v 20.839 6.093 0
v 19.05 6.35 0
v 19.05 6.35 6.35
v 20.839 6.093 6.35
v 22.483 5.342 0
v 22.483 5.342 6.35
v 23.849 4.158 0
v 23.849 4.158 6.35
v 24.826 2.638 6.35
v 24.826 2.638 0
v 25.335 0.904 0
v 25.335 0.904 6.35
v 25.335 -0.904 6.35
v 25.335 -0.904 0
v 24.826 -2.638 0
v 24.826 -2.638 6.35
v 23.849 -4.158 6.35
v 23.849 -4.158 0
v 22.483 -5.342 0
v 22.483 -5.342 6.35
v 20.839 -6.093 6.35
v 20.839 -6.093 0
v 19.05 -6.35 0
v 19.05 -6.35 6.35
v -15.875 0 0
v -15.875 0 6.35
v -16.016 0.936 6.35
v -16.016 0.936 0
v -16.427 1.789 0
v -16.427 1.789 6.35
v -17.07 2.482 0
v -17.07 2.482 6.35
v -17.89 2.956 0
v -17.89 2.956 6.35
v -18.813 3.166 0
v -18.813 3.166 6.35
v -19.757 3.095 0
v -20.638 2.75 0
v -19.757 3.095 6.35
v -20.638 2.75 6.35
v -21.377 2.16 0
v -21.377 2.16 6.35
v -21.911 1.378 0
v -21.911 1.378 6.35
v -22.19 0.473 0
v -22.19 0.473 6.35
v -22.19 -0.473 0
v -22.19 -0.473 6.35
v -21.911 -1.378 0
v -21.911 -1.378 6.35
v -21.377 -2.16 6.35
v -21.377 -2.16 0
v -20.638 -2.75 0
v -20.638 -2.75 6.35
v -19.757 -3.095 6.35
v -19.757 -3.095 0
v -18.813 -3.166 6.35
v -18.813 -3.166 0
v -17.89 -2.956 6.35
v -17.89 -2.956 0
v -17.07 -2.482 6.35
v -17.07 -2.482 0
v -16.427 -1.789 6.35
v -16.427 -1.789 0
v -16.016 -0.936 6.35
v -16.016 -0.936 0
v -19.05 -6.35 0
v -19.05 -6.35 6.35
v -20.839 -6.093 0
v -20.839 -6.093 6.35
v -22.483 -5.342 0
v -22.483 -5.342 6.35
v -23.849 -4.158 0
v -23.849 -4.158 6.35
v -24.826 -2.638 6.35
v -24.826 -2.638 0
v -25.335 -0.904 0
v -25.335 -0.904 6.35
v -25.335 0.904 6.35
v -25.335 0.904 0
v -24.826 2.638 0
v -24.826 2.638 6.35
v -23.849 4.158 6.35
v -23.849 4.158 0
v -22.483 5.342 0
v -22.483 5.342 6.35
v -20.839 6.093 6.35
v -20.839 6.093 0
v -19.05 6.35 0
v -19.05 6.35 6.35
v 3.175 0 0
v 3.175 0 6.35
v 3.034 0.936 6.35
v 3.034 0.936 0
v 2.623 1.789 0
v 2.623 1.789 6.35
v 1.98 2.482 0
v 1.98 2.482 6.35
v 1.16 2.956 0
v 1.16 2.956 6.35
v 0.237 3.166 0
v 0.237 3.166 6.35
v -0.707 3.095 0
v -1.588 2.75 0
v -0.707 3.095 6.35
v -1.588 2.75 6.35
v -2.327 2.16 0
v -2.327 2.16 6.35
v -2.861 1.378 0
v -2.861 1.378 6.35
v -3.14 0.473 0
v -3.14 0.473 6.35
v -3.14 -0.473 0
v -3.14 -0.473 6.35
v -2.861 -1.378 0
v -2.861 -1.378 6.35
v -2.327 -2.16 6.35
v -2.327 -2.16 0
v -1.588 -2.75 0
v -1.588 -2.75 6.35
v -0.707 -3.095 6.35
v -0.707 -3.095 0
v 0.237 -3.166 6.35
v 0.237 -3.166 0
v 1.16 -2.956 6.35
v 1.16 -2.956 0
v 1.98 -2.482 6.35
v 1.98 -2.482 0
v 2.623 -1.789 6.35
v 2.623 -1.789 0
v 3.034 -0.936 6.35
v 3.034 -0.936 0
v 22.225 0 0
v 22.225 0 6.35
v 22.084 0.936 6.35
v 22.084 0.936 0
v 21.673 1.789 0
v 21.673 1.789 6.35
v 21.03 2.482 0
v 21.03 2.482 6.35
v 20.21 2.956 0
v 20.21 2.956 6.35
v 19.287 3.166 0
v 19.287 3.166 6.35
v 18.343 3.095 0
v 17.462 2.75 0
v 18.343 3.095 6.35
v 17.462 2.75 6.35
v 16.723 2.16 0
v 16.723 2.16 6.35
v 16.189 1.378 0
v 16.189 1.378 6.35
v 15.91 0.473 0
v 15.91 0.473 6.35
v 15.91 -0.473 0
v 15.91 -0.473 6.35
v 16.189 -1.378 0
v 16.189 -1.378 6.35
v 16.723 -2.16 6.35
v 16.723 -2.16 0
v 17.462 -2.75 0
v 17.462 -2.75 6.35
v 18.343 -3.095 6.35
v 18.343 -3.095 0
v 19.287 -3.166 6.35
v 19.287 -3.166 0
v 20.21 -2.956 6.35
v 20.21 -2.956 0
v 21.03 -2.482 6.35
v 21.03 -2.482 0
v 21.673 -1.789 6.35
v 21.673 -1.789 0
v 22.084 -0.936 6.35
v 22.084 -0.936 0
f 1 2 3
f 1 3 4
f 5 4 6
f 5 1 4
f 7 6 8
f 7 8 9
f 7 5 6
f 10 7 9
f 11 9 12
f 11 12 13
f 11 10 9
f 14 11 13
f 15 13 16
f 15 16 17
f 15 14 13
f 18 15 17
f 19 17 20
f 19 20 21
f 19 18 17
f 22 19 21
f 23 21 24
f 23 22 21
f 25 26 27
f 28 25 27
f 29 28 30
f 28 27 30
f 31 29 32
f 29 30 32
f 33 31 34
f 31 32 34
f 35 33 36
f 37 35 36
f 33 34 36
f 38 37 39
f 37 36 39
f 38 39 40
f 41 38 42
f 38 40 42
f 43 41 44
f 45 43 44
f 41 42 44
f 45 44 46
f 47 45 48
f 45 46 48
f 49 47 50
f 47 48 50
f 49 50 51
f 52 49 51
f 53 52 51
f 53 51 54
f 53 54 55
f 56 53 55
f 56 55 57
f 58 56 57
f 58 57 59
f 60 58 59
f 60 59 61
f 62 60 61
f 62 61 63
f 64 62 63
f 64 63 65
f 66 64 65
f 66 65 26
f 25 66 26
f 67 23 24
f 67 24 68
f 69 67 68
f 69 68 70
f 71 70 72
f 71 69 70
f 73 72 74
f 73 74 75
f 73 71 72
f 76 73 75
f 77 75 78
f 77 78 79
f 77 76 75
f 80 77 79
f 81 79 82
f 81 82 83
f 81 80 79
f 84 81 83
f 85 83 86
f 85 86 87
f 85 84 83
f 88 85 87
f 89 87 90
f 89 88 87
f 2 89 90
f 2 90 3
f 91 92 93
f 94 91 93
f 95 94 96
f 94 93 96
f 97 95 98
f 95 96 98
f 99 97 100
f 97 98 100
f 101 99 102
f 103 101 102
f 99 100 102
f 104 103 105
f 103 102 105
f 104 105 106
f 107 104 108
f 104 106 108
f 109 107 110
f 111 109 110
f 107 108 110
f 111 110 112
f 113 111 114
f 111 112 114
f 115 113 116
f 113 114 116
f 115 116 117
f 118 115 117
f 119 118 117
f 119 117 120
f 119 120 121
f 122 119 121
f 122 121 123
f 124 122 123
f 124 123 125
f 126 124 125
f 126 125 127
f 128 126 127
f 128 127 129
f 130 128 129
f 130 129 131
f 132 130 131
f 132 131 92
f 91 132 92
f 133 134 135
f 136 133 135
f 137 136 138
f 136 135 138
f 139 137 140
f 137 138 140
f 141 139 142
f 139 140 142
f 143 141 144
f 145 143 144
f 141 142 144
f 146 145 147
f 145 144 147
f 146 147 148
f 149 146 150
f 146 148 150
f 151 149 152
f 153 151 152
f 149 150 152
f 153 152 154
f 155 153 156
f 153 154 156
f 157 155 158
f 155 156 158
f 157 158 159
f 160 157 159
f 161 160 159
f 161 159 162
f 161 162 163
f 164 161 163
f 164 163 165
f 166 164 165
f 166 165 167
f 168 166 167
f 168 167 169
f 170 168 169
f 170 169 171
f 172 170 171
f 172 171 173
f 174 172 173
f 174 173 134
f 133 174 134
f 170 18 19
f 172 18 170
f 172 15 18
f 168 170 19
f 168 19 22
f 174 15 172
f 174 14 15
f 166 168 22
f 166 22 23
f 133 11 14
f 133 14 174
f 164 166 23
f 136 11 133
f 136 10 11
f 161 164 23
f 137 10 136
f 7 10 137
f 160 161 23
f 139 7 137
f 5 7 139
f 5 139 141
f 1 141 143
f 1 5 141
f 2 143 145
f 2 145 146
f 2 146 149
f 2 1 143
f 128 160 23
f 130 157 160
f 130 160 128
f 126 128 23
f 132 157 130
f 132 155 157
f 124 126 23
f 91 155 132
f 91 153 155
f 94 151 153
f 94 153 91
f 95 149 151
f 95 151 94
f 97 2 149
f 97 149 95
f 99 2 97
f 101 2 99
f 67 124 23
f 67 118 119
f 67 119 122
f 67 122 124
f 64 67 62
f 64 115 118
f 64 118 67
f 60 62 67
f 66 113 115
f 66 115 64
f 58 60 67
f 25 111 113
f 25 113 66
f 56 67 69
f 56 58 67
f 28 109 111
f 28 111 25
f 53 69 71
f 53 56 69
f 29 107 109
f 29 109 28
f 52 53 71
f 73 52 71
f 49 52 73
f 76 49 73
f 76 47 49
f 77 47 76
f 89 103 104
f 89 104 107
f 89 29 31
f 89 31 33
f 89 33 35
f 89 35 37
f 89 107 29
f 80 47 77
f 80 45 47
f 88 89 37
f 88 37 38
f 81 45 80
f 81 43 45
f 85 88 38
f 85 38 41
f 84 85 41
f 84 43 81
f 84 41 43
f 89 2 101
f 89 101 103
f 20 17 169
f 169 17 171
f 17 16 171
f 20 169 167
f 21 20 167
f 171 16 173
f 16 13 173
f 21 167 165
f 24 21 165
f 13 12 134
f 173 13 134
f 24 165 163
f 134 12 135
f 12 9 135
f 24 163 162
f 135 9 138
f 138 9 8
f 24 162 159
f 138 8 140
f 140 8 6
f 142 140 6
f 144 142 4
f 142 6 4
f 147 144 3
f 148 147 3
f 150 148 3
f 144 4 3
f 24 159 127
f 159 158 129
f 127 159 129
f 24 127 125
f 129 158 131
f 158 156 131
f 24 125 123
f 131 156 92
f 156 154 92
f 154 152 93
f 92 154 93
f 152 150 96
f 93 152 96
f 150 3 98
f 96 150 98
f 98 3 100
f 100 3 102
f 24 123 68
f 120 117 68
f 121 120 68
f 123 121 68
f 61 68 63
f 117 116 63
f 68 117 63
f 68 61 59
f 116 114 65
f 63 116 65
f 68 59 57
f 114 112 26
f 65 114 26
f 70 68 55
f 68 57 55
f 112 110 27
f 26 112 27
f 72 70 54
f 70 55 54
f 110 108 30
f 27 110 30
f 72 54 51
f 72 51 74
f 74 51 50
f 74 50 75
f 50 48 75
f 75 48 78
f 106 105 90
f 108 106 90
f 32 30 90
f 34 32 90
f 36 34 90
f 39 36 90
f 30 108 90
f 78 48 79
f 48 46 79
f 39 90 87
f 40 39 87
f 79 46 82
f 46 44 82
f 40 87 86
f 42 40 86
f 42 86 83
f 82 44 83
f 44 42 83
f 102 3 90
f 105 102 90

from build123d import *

# Parameters (mm, degrees)
BOSS_EXTRUDE1_DEPTH = 6.35
SKETCH3_R           = 3.175
CUT_EXTRUDE1_DEPTH  = 27.940768363


with BuildPart() as part:
    # Sketch2 → Boss-Extrude1 (new body)
    with BuildSketch(Plane.XY):
        with BuildLine():
            Line((19.05, -6.35), (-19.05, -6.35))
            ThreePointArc((-19.05, -6.35), (-25.4, 0), (-19.05, 6.35))
            Line((-19.05, 6.35), (19.05, 6.35))
            ThreePointArc((19.05, 6.35), (25.4, 0), (19.05, -6.35))
        make_face()
    extrude(amount=BOSS_EXTRUDE1_DEPTH)

    # Sketch3 → Cut-Extrude1 (cut, through all)
    with BuildSketch(Plane.XY.offset(6.35)):
        with Locations((-19.05, 0)):
            Circle(SKETCH3_R)
        Circle(SKETCH3_R)
        with Locations((19.05, 0)):
            Circle(SKETCH3_R)
    extrude(amount=-CUT_EXTRUDE1_DEPTH, mode=Mode.SUBTRACT)


solid = part.part
